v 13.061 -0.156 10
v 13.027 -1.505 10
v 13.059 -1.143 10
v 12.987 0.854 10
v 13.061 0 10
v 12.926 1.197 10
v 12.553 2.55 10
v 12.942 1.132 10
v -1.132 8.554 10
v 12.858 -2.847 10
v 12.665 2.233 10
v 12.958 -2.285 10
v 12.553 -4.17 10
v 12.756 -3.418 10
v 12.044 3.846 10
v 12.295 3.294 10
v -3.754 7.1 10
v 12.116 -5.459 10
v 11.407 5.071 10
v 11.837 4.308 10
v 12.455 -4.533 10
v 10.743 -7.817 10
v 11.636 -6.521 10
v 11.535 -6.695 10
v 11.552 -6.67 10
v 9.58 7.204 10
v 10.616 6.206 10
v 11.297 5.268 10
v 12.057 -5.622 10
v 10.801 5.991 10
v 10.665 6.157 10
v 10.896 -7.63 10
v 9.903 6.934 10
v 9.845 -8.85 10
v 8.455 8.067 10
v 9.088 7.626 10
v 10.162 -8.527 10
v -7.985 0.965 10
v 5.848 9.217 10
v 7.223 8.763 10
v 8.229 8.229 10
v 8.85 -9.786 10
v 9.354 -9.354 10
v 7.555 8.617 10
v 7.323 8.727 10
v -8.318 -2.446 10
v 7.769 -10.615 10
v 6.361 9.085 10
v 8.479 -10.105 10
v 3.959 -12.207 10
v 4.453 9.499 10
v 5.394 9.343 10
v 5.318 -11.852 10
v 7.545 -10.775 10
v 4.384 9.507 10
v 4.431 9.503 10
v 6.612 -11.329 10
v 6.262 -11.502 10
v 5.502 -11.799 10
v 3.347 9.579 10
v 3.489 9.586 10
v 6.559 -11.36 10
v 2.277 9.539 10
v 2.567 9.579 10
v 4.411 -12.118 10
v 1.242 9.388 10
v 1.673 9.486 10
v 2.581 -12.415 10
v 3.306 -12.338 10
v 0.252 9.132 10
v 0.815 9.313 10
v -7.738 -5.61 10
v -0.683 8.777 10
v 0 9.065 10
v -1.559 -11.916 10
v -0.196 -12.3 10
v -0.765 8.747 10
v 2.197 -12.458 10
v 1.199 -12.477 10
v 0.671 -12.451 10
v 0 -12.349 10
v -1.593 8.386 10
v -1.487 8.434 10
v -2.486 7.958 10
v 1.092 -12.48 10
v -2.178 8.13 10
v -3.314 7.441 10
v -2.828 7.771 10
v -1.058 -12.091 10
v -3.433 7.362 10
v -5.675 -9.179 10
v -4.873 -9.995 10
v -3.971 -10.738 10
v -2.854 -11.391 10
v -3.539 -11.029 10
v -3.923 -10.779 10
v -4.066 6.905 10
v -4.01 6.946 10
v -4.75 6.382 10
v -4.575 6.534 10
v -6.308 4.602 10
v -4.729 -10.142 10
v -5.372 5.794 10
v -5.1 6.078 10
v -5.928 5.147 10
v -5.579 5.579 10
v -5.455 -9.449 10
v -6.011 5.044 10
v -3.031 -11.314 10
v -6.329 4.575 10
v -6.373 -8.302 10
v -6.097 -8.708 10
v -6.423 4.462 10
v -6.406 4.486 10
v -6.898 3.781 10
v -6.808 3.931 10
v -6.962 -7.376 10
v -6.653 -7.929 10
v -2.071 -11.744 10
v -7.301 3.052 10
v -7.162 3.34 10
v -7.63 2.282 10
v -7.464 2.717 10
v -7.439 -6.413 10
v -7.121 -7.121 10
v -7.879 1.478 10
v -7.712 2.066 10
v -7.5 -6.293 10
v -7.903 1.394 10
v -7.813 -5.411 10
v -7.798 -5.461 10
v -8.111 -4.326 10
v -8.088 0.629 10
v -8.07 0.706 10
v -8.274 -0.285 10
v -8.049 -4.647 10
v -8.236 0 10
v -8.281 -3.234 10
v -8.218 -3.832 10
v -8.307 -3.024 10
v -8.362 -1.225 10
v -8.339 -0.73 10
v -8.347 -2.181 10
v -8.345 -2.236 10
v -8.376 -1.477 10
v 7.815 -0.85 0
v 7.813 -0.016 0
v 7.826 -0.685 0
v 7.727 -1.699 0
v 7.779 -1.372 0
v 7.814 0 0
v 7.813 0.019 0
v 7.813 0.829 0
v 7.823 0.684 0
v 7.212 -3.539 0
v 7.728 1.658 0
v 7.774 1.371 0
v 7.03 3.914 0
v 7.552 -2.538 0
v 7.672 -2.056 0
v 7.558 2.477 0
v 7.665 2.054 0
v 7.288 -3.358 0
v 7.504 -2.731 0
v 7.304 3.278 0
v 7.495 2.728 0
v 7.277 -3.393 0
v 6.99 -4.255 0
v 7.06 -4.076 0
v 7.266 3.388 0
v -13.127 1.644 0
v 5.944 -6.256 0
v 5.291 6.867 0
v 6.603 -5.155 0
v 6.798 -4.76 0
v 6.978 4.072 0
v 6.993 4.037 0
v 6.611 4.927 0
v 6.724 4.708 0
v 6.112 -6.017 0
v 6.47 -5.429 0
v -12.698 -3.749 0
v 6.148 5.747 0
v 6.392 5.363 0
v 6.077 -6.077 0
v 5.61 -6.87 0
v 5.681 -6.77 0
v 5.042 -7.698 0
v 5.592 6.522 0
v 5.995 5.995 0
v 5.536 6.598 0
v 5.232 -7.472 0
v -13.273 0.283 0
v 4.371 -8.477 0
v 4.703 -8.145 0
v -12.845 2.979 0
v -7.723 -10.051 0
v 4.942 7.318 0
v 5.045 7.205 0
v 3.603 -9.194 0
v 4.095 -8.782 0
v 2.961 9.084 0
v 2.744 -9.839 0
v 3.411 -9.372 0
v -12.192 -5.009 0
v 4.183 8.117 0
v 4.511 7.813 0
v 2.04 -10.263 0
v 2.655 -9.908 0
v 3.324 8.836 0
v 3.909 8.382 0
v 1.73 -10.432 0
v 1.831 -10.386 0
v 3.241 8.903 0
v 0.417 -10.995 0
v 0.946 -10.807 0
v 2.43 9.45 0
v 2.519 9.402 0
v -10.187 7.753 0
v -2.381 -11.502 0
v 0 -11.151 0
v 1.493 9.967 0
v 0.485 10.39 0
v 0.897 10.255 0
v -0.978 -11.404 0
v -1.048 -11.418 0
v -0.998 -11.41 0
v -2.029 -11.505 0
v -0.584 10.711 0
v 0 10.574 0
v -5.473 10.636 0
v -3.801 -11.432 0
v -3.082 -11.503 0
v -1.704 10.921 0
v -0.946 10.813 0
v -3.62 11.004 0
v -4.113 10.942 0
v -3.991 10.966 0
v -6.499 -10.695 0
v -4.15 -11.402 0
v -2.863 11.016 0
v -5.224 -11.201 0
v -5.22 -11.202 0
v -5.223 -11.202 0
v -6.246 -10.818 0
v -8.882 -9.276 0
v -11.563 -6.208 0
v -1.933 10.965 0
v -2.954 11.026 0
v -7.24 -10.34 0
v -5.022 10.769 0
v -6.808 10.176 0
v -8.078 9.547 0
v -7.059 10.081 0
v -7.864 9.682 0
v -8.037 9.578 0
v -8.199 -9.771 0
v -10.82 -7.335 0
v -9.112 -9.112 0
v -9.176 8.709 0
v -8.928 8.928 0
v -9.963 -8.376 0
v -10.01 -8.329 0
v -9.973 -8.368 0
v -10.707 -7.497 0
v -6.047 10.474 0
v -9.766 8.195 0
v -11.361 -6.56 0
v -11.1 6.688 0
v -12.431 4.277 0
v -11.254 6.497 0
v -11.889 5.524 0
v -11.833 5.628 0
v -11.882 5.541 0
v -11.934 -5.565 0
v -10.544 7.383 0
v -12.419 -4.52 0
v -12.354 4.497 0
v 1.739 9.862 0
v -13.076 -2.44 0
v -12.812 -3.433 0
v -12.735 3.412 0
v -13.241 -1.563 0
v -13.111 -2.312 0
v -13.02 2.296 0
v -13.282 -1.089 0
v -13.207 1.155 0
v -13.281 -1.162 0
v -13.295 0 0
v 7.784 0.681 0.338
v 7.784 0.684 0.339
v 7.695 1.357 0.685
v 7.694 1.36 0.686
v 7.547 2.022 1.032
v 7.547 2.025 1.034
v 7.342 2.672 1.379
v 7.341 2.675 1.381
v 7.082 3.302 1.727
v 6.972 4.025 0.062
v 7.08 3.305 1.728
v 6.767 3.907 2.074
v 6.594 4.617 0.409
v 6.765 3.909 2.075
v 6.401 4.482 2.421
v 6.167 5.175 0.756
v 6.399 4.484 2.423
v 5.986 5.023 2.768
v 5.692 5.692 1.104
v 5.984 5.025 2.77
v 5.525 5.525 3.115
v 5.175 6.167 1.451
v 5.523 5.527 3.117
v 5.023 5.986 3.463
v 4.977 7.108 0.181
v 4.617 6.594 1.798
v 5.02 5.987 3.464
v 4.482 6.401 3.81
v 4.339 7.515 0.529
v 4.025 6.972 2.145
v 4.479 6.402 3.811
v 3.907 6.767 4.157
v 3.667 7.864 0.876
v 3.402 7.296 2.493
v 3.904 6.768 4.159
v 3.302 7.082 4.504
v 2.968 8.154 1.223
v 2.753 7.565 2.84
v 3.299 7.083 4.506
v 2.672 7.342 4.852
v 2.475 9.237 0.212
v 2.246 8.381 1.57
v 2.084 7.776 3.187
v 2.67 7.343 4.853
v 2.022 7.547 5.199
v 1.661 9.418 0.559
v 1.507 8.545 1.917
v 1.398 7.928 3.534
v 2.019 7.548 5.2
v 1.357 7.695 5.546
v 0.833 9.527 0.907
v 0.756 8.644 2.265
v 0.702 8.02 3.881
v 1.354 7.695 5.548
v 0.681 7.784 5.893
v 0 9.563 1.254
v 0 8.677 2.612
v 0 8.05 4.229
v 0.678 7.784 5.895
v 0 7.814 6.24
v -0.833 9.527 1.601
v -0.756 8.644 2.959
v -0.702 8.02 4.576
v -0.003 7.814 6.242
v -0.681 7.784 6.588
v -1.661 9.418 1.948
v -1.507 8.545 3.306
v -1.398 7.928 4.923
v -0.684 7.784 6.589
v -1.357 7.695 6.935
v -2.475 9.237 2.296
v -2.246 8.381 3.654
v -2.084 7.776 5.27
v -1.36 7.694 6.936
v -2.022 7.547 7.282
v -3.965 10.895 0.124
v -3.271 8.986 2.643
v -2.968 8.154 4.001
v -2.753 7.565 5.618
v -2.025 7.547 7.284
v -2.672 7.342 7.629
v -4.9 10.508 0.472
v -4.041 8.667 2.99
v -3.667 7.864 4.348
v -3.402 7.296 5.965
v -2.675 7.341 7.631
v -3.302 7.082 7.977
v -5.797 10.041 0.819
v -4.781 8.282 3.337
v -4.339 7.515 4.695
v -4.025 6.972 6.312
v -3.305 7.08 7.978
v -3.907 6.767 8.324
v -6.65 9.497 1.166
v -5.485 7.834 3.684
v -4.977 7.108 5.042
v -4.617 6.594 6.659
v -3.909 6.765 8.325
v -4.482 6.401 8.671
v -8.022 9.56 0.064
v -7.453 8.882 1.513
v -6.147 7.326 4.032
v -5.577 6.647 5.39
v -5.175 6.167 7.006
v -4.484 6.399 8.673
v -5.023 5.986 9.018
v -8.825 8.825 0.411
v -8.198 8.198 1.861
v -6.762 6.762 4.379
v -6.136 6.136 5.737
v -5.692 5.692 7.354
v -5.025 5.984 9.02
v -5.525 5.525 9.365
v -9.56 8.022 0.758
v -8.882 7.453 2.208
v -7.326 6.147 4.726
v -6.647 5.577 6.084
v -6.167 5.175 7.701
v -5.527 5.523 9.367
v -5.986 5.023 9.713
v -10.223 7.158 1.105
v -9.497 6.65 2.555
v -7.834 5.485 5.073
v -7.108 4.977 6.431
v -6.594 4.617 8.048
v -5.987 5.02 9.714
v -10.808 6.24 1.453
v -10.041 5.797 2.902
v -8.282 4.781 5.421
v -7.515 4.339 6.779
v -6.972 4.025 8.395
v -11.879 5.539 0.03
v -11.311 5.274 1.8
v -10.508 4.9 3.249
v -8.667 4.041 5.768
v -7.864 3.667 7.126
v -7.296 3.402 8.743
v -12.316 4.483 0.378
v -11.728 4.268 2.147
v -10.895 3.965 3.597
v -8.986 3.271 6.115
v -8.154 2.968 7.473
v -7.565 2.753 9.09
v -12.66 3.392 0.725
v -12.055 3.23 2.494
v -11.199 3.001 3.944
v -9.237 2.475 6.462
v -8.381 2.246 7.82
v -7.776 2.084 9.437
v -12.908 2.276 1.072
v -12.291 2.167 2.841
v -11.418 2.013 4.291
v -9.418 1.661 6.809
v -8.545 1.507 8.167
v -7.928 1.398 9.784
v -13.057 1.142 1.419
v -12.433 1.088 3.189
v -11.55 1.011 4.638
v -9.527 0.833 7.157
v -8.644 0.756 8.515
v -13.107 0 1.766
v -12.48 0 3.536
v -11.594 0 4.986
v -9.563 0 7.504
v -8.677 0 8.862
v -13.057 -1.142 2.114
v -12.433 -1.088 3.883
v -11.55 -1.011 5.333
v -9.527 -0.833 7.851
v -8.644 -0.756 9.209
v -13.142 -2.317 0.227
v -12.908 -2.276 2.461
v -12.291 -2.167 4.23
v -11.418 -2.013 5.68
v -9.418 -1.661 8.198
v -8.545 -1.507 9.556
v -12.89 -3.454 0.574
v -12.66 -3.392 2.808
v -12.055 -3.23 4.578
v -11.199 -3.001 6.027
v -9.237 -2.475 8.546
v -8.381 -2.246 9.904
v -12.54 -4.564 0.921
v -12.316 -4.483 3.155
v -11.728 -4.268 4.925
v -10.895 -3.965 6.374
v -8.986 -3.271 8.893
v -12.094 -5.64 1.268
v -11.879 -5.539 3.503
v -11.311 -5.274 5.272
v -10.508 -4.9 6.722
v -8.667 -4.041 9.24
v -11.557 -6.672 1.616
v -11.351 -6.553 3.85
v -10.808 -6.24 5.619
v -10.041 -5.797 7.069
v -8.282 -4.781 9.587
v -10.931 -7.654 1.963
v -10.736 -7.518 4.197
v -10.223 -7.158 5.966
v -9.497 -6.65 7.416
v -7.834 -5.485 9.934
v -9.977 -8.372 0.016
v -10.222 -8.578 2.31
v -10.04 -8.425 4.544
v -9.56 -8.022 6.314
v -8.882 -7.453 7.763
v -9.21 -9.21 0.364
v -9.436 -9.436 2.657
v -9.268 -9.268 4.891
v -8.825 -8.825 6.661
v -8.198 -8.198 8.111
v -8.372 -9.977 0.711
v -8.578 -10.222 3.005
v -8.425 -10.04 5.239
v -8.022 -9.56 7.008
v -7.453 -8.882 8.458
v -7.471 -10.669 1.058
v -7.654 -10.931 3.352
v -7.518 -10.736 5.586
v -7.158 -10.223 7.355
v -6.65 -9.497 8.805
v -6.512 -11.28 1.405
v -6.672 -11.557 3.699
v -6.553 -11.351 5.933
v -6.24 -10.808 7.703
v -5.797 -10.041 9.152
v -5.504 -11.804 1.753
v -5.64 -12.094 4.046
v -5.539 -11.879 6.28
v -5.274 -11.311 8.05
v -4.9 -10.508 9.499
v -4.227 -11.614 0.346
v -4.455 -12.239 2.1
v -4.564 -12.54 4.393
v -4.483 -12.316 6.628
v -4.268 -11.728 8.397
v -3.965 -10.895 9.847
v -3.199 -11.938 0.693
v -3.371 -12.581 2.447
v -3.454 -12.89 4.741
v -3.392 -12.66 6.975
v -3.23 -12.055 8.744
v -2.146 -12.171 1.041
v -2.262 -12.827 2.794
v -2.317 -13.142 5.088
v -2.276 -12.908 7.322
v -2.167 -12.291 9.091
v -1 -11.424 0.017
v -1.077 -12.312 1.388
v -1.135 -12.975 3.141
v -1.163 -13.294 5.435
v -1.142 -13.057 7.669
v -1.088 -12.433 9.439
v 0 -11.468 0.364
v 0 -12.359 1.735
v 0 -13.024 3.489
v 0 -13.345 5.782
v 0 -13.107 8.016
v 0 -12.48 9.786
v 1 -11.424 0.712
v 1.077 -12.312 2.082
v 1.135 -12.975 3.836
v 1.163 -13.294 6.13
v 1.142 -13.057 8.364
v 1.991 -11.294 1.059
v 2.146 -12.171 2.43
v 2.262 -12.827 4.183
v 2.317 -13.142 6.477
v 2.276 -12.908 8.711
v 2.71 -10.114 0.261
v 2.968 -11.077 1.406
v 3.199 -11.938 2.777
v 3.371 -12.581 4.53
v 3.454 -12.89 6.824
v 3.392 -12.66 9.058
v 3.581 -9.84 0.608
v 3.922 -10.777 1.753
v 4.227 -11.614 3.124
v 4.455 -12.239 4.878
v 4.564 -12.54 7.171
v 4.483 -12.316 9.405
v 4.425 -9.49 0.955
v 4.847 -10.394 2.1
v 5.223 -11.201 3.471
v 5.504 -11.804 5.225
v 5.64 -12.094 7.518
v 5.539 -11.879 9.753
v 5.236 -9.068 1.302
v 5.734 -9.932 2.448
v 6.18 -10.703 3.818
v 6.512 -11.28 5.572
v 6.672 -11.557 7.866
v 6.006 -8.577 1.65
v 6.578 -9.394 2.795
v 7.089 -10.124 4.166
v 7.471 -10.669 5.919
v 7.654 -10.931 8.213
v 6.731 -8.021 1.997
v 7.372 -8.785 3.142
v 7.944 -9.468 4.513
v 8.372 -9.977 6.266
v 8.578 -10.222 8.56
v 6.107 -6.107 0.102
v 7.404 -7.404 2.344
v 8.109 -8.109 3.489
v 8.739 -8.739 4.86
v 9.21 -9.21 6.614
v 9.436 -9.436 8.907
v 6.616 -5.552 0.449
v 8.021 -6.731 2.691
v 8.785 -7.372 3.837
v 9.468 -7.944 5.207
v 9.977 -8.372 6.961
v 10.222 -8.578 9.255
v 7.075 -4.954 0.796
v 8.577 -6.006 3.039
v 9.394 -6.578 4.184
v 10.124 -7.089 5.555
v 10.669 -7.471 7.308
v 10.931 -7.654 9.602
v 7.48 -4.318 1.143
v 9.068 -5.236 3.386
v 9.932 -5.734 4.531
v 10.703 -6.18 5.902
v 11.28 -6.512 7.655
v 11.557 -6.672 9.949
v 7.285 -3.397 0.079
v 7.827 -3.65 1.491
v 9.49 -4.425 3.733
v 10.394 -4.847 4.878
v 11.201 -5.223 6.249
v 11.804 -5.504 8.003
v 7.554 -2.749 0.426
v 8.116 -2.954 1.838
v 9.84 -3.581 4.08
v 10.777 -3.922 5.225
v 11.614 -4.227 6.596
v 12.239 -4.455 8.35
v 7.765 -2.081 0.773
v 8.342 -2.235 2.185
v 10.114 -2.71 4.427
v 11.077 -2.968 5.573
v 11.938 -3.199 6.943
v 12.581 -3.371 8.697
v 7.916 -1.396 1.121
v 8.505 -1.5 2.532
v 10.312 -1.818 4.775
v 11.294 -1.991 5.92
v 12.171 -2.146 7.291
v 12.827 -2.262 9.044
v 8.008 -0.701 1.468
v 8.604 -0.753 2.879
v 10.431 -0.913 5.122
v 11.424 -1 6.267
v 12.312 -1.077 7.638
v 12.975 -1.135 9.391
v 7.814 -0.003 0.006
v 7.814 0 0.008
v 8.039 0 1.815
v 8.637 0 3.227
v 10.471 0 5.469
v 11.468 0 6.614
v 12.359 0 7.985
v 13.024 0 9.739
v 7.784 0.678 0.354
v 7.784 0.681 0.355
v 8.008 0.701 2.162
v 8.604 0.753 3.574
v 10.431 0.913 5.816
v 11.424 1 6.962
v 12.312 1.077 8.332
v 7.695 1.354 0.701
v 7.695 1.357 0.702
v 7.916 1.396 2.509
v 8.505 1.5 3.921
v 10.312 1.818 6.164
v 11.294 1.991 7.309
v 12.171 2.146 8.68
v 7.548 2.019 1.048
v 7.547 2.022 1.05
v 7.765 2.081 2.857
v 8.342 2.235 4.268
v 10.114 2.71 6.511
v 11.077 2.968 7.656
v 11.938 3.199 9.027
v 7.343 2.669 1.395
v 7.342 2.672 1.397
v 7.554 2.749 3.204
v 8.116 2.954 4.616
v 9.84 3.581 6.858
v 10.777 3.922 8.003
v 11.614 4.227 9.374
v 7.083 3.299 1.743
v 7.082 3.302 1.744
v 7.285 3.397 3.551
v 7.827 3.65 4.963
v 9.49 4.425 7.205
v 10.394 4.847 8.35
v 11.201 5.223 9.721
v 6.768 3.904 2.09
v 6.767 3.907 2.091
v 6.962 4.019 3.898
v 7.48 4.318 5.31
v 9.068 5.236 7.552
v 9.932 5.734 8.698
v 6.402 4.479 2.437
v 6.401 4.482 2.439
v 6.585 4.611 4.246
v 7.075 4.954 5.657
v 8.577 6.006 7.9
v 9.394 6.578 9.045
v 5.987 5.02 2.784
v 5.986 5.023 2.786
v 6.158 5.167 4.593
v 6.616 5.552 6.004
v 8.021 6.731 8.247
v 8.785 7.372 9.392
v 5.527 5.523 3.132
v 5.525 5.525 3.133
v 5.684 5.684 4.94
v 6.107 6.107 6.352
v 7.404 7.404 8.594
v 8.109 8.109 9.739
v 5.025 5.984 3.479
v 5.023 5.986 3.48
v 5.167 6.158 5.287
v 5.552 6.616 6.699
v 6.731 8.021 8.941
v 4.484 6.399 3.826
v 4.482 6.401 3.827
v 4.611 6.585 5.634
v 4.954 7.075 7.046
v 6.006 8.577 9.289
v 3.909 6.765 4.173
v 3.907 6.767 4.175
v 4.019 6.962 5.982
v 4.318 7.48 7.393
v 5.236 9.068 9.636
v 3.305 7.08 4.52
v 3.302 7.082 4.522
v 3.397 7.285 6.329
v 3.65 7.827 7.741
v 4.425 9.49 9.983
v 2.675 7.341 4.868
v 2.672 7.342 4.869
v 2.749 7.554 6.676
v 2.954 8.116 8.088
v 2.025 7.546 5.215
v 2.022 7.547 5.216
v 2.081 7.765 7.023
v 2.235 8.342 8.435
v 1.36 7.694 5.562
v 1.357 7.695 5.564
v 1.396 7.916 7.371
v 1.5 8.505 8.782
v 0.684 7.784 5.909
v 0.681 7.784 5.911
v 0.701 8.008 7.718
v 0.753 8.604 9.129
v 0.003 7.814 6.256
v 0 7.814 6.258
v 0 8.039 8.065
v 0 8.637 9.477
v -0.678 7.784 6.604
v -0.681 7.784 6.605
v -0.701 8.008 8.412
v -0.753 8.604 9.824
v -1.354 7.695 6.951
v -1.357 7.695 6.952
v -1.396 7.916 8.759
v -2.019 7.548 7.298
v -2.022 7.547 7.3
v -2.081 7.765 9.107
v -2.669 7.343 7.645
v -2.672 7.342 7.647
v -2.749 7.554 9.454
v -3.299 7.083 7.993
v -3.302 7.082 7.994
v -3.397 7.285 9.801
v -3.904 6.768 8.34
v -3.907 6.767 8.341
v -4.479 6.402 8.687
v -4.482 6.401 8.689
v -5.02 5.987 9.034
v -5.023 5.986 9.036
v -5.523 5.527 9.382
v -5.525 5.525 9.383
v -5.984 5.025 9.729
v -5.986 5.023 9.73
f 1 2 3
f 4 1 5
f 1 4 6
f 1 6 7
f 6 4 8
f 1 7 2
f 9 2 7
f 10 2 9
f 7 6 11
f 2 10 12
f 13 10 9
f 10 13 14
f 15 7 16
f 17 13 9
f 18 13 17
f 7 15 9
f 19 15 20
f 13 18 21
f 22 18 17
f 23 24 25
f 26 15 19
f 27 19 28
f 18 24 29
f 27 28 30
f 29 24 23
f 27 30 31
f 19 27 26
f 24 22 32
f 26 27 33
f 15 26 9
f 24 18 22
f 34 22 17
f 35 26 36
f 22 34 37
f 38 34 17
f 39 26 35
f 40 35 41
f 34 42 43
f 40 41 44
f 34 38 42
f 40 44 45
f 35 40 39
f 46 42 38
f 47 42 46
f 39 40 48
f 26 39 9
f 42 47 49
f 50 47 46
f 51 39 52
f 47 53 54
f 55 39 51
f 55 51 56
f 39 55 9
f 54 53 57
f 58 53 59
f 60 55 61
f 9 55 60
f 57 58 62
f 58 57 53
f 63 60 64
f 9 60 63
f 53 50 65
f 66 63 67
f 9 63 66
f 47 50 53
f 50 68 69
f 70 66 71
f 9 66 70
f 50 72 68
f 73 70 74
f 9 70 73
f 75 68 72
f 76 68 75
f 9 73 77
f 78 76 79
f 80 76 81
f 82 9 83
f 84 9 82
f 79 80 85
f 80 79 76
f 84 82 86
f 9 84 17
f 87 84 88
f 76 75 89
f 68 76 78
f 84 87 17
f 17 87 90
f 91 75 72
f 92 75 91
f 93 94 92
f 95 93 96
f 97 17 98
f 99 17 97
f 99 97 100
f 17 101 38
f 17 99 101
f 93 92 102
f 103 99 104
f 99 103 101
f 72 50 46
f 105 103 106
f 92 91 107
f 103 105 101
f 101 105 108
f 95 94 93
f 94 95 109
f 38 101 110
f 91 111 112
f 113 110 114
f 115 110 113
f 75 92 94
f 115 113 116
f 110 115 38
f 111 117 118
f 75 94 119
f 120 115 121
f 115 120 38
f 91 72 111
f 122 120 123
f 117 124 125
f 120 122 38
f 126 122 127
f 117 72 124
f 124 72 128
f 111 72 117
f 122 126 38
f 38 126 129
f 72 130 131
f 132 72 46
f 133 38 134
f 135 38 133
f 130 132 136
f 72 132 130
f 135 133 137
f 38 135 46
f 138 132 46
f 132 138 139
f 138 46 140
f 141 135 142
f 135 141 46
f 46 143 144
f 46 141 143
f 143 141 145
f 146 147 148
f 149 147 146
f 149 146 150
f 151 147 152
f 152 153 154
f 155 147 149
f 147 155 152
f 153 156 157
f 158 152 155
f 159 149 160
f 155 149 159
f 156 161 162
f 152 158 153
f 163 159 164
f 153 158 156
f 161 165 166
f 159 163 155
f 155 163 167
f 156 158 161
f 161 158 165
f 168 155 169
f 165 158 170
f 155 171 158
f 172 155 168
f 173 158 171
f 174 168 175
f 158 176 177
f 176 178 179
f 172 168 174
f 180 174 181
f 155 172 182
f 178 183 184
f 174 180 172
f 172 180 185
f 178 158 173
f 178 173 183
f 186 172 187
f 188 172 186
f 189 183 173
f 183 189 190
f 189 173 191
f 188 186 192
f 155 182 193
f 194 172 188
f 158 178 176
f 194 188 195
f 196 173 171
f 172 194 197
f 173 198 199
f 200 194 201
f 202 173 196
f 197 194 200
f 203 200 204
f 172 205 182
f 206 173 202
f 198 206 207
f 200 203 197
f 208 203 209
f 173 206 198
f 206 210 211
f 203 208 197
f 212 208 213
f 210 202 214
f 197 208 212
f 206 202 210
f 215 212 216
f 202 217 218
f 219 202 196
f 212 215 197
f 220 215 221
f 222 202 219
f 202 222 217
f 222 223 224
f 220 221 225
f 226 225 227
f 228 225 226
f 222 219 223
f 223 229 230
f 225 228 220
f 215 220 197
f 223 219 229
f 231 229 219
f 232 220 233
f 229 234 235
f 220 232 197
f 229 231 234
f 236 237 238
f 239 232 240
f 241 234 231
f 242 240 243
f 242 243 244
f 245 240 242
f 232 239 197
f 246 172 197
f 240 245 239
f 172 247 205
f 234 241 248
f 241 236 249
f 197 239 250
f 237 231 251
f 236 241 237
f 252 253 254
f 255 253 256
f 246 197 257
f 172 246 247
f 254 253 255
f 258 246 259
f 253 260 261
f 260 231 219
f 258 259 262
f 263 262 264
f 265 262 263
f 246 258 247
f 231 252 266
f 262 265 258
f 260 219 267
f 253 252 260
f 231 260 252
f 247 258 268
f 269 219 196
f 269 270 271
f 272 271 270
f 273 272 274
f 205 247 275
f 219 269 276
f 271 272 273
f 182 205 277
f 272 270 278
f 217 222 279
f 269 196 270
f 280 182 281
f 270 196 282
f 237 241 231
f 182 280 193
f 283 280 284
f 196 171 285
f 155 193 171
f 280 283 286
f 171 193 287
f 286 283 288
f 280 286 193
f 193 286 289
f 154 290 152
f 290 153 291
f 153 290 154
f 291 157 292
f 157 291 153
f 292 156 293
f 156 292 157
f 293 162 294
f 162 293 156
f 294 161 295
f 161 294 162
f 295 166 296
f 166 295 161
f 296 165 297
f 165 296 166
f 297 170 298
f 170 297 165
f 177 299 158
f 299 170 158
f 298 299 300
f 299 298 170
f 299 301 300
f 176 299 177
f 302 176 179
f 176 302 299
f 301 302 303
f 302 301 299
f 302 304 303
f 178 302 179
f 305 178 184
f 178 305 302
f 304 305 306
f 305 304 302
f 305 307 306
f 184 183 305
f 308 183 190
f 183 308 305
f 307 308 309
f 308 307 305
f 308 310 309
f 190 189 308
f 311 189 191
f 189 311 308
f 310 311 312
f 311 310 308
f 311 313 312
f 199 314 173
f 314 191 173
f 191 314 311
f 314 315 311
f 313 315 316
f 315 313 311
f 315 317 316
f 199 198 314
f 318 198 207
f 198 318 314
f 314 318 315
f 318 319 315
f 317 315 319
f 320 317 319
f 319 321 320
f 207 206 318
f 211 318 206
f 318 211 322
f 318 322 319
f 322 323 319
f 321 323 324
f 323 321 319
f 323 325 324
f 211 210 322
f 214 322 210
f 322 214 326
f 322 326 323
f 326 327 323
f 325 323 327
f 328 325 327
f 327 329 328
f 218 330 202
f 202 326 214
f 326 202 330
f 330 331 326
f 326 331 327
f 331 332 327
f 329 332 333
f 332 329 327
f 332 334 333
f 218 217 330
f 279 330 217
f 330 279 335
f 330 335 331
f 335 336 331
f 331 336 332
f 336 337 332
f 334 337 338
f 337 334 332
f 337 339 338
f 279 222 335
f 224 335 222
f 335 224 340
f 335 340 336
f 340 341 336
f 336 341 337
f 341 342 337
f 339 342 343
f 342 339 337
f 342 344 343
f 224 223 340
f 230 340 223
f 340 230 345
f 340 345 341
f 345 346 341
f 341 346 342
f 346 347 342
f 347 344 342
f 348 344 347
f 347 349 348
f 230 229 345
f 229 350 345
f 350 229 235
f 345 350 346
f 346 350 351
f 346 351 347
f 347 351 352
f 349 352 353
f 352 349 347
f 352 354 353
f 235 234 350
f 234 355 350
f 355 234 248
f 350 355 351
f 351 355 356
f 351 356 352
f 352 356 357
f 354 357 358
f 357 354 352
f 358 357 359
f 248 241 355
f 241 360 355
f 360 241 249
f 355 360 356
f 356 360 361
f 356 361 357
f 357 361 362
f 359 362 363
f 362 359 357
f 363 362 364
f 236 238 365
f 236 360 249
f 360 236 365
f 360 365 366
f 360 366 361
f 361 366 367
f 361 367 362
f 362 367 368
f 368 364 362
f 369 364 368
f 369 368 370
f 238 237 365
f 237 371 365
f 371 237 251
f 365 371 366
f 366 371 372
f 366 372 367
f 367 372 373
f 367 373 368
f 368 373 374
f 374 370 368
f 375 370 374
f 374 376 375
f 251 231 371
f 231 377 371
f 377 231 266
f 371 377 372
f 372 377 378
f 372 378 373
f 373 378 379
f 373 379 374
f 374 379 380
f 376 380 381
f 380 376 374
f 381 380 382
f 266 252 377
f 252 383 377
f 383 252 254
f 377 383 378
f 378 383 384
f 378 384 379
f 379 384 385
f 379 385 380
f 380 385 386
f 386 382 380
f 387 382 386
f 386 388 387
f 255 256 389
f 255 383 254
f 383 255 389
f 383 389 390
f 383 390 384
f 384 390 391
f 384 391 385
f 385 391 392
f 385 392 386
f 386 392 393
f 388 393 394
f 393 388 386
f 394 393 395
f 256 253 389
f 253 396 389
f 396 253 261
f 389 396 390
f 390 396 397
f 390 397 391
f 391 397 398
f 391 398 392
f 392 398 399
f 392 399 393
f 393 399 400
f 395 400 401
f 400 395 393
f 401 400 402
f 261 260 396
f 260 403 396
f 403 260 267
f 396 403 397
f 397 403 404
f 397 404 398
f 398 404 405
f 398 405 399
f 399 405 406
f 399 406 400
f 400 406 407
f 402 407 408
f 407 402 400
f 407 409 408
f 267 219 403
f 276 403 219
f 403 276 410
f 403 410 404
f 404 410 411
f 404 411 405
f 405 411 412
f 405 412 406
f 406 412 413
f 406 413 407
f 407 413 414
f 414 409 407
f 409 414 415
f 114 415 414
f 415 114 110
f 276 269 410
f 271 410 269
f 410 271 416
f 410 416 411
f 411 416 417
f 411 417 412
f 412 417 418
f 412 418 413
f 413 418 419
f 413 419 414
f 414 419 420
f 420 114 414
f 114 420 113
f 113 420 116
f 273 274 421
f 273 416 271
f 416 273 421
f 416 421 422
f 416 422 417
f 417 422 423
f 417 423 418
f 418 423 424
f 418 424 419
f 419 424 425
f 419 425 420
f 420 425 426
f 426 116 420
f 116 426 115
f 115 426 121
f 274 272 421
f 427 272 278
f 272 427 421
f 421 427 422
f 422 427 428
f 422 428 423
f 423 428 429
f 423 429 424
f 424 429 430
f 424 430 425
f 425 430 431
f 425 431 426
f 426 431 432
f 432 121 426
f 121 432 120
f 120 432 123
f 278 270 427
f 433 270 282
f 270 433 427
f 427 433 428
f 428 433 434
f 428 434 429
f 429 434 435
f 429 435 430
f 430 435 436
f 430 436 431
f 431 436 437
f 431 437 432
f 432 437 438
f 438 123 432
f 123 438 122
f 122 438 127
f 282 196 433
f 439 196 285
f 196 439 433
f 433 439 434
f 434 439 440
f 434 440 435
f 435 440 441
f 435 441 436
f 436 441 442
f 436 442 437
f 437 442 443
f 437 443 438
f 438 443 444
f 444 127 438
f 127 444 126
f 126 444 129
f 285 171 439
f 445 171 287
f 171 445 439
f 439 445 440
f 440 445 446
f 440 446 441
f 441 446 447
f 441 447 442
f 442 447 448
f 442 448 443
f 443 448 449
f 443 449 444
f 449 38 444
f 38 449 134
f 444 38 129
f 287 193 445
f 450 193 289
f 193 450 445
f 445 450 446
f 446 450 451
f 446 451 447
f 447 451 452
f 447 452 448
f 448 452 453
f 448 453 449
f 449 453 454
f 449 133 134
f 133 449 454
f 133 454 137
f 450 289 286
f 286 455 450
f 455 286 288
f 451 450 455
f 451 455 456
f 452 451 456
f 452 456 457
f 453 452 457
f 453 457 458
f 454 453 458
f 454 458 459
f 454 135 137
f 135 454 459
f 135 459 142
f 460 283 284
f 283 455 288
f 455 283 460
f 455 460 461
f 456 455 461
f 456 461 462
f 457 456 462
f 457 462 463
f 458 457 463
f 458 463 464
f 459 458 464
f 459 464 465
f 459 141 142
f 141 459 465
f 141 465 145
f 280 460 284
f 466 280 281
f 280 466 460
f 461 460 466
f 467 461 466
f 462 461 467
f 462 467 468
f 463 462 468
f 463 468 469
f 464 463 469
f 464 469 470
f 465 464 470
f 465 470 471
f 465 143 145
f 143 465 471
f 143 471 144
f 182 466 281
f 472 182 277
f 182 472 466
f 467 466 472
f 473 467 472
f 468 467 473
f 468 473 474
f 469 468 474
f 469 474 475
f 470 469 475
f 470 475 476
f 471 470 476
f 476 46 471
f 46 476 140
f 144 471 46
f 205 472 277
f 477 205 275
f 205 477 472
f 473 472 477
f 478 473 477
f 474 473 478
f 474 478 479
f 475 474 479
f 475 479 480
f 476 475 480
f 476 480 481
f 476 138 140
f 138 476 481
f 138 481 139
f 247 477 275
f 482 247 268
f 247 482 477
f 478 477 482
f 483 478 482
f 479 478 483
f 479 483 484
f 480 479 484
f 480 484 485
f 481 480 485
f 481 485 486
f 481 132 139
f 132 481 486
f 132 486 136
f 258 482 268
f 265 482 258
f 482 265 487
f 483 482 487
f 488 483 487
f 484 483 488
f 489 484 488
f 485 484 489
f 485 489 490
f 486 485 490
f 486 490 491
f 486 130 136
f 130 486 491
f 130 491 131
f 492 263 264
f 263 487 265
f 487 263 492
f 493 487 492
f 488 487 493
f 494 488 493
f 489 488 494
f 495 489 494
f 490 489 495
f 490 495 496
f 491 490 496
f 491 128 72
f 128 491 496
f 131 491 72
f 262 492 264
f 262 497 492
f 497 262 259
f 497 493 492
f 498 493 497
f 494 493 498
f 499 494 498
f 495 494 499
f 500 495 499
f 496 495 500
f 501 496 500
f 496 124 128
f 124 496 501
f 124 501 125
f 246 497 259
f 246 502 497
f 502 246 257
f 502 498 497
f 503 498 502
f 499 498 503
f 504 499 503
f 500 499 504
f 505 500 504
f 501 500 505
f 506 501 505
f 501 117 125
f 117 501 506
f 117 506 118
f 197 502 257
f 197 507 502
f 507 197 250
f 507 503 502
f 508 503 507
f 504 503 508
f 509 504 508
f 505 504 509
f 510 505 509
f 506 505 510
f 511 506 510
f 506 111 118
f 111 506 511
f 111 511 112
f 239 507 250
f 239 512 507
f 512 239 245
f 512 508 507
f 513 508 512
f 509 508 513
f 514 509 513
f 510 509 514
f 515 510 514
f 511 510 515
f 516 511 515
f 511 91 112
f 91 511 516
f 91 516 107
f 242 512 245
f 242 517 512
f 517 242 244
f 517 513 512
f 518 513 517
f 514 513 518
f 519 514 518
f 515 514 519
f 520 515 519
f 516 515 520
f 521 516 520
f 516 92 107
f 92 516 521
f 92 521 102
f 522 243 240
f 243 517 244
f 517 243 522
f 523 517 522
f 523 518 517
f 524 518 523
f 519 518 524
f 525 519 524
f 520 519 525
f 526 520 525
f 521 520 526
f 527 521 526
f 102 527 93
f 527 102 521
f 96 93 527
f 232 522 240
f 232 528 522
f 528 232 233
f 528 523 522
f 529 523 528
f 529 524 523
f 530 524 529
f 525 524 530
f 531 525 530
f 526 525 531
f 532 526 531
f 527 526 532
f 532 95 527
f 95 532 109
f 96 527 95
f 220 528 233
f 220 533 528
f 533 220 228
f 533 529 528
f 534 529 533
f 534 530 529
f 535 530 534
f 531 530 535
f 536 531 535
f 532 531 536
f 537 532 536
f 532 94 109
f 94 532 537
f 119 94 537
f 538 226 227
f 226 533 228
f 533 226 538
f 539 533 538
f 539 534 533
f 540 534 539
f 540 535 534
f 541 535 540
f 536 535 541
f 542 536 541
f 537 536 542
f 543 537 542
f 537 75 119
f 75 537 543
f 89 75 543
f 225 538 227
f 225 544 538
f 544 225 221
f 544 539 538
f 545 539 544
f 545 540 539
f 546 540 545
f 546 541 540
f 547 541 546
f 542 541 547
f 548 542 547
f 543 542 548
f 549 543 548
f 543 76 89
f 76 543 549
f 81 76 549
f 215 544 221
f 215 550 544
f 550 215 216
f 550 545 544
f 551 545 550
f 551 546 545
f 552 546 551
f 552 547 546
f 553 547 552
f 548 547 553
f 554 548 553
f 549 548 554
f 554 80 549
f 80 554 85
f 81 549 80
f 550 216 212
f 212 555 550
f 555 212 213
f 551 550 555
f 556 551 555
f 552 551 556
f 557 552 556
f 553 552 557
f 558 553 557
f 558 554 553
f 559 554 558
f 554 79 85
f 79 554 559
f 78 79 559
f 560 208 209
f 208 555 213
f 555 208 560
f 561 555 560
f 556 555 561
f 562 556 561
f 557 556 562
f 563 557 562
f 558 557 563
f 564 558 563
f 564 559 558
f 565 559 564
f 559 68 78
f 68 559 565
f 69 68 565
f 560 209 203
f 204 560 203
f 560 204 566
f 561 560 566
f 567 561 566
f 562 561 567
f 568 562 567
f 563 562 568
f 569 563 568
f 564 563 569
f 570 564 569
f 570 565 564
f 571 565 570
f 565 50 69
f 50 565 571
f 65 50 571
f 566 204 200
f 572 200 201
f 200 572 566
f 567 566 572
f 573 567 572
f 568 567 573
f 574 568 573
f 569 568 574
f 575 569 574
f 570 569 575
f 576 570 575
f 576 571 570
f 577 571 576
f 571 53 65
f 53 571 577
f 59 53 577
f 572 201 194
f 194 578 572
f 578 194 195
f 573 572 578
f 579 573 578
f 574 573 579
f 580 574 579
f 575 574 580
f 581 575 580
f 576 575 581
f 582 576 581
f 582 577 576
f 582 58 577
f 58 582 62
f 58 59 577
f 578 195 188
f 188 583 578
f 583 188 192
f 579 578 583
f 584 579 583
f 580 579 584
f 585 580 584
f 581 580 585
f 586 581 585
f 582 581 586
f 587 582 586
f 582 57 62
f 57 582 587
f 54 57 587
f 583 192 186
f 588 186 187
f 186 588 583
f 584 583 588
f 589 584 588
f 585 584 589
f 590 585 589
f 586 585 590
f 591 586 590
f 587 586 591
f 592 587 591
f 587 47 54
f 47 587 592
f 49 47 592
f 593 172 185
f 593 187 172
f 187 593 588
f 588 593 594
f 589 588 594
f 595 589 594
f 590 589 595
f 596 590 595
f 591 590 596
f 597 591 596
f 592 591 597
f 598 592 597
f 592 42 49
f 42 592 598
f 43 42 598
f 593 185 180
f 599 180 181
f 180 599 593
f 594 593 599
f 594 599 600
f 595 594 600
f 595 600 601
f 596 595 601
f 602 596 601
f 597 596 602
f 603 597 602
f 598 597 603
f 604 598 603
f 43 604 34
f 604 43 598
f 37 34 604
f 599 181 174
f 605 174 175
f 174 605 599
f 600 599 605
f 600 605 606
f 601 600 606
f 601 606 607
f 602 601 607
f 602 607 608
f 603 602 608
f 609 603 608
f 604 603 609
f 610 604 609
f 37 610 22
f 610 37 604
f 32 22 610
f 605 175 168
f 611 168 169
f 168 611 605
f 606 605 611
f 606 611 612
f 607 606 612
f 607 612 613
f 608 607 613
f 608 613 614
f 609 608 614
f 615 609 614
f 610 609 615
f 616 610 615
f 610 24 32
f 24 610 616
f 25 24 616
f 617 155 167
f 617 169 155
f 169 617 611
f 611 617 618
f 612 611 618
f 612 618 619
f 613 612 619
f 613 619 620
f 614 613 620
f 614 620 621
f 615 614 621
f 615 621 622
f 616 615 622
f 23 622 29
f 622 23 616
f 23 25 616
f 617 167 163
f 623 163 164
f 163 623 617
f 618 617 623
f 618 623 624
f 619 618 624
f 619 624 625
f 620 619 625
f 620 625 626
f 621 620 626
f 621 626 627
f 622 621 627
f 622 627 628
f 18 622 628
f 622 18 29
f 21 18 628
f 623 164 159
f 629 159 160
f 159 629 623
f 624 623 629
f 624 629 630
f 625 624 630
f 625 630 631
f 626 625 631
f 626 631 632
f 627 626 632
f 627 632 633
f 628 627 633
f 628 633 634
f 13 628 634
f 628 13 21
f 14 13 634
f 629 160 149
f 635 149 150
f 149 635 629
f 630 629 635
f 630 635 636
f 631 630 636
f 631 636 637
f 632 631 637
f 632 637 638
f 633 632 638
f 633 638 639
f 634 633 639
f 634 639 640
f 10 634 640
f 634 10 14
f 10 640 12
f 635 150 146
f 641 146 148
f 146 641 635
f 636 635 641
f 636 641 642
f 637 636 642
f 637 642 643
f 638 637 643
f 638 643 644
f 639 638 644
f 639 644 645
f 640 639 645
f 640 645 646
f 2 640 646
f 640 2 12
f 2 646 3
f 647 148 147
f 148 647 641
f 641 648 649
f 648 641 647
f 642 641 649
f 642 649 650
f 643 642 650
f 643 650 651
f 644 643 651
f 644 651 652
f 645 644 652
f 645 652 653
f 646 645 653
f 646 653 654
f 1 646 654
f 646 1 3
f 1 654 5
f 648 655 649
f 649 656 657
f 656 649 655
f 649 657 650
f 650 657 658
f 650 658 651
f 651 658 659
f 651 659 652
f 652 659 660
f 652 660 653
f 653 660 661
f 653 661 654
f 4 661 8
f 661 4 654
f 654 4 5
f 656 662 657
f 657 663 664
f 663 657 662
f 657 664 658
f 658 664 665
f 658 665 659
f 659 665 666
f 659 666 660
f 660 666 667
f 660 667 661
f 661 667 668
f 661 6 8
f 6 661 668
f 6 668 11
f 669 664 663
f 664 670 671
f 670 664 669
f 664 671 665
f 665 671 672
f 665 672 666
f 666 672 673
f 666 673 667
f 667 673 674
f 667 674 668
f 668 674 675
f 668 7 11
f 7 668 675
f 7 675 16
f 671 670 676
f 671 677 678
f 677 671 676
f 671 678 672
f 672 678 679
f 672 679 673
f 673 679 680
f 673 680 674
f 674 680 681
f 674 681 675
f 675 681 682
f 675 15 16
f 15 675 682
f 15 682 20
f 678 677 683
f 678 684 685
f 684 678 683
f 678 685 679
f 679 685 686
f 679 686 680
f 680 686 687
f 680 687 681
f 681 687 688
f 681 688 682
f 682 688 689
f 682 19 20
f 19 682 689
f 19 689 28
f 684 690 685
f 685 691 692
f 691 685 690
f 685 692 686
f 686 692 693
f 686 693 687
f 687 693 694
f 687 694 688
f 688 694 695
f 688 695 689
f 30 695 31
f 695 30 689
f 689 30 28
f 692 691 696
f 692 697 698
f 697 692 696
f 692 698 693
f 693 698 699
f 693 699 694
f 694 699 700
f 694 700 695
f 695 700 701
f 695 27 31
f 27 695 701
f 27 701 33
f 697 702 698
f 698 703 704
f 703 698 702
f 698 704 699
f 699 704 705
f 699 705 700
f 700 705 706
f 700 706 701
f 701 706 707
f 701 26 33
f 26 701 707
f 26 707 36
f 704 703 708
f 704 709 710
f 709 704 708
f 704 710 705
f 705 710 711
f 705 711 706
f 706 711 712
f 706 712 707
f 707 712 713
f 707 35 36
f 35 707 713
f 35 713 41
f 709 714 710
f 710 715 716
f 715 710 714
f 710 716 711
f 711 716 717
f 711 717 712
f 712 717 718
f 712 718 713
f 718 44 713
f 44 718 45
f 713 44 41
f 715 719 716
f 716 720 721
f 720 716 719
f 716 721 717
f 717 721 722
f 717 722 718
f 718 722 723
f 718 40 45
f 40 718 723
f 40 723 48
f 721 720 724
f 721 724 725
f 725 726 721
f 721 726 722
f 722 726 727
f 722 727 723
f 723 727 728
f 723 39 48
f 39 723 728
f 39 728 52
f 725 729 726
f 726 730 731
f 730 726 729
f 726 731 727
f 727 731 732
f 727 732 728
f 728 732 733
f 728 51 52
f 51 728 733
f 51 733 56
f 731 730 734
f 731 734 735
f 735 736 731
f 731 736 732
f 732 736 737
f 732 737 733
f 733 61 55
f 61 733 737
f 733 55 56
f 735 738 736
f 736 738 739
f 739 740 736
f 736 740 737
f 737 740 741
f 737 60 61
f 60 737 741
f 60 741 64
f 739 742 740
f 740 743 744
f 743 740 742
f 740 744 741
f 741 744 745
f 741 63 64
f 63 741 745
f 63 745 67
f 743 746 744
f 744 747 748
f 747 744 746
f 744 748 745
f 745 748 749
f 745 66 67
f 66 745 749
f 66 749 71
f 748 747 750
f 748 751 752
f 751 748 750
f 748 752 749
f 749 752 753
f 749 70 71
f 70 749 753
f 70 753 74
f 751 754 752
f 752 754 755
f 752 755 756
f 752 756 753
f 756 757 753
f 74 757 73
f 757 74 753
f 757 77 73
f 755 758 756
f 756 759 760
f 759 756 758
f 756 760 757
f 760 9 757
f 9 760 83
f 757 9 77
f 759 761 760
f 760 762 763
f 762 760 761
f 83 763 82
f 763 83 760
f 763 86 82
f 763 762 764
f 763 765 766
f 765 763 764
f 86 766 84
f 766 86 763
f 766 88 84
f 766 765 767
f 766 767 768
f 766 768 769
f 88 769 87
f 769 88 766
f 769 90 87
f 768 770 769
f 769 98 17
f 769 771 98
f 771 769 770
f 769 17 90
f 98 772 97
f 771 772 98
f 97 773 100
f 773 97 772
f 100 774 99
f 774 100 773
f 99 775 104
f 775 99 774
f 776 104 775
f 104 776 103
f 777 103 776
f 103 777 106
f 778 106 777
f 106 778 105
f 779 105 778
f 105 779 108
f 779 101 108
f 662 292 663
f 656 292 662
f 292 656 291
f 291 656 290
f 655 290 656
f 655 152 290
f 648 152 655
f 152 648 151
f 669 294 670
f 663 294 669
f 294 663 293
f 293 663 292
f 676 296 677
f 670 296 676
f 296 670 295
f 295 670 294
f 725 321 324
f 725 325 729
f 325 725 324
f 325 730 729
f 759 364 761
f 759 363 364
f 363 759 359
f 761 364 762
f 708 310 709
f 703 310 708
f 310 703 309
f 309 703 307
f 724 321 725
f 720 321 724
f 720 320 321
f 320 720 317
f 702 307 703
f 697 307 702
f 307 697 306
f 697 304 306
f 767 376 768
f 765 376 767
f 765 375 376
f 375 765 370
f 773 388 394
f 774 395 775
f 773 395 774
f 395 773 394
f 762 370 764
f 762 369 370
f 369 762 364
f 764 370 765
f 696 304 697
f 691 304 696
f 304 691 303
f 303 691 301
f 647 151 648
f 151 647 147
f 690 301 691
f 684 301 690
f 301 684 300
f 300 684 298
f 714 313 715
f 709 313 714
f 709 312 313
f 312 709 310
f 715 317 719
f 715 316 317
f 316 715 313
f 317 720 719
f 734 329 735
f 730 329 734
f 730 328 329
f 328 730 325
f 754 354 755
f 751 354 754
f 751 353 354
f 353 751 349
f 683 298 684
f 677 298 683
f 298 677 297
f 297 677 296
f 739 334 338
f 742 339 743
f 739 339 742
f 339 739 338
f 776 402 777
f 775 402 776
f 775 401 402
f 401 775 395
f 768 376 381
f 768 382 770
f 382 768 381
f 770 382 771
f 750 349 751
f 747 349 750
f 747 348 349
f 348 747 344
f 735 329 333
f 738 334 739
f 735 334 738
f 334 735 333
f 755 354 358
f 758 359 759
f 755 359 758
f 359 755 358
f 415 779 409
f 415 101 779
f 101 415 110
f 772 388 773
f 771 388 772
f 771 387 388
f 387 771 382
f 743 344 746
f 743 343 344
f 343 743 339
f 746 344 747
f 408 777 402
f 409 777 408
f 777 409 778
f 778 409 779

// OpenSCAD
// file: quickthread.scad
function _ringPoints(param) = len(param[0]);
function _ringValue(param,point) = param[0][point];
function _numTurns(param) = param[2];
function _numRings(param) = 1+_numTurns(param)*$fn;
function _radius(param) = param[1];
function _lead(param) = param[3];

extrNudge = 0.001;

function extrPoints(param) = 
    let (n=_ringPoints(param),
        r=_radius(param),
        m=_numRings(param),
        l=_lead(param)
        ) 
        [ for (i=[0:m-1]) for (j=[0:n-1]) 
            let (z=i/$fn*l,
                angle=(i%$fn)/$fn*360,
                v=_ringValue(param,j))
            [ (r+v[0])*cos(angle), (r+v[0])*sin(angle),z+v[1]] ];
        
function mod(m,n) = let(mm = m%n) mm<0 ? n+mm : mm;
        
function extrPointIndex(param,ring,point) = 
    let (n=_ringPoints(param)) 
        n*ring + mod(point,n);
        
function startFacePoints(param) = 
    let (n=_ringPoints(param)) 
        [for (i=[0:n-1]) extrPointIndex(param,0,i)];
            
function endFacePoints(param) = 
    let (m=_numRings(param), n=_ringPoints(param)) 
            [for (i=[n-1:-1:0]) extrPointIndex(param,m-1,i)];
                
function tubeFaces(param) =
    let (m=_numRings(param), n=_ringPoints(param))
            [for (i=[0:m-2]) for (j=[0:n-1]) for(tri=[0:1])
                tri==0 ? 
                    [extrPointIndex(param,i,j),extrPointIndex(param,i+1,j),extrPointIndex(param,i,j+1)] :
                    [extrPointIndex(param,i,j+1), extrPointIndex(param,i+1,j),
            extrPointIndex(param,i+1,j+1)]];
                

function extrFaces(param) = concat([startFacePoints(param)],concat(tubeFaces(param),[endFacePoints(param)]));

                    
module rawThread(profile, r=undef, d=undef, height=10, lead=undef, $fn=72, adjustRadius=false) {
    radius = (r==undef ? d/2 : r);
    vSize = max([for(v1=profile) for(v2=profile) v2[1]-v1[1]]);
    vMin = min([for(v=profile) v[0]]);
    radiusAdjustment = adjustRadius ? vMin : 0;
    _lead = lead==undef ? vSize : lead;
    profileScale = vSize <= _lead-extrNudge ? 1 : (_lead-extrNudge)/vSize;
    adjProfile = [for(v=profile) [v[0]-radiusAdjustment,v[1]*profileScale]];
    adjRadius = radius + radiusAdjustment;
    hSize = 1+2*adjRadius + 2*max([for (v=adjProfile) v[0]]);
    numTurns = 2+ceil(height/_lead);
    param = [adjProfile, adjRadius, numTurns, _lead];
    render(convexity=10)
    union() {
        intersection() {
            translate([-hSize/2,-hSize/2,0]) cube([hSize,hSize,height]);
            translate([0,0,-_lead]) polyhedron(faces=extrFaces(param),points=extrPoints(param));
        }
        //rotate([0,0,180/$fn]) 
        cylinder(r=adjRadius+extrNudge,$fn=$fn,h=height);
    }
}

// internal = female
module isoMetricThread(d=undef, r=undef, pitch=1, h=10, lead=undef, angle=30, internal=false, $fn=72) {
    radius = r==undef ? d/2 : r;
    Dmaj = 2*radius;
    H = pitch * cos(angle);
    _lead = lead==undef ? pitch : lead;
    externalReliefRatio=0.03;
    internalReliefRatio=0.057;
    profile = !internal ? 
        [ [-H*externalReliefRatio,(-3/8)*pitch-pitch*externalReliefRatio], /* [0,-(3/8)*pitch], */ 
    [(5/8)*H,-pitch/16],[(5/8)*H,pitch/16], /*[0,(3/8)*pitch],*/
    [-H*externalReliefRatio,(3/8)*pitch+pitch*externalReliefRatio] ] :
        [ [0,-(3/8)*pitch], [(5/8)*H,-pitch/16],[(5/8)*H+H*externalReliefRatio,0],[(5/8)*H,pitch/16],[0,(3/8)*pitch] ];
    Dmin = Dmaj-2*H/4;
    myFN=$fn;
    rawThread(profile,d=Dmin,height=h,lead=_lead,$fn=myFN,adjustRadius=true);        
}

//rawThread([[0,0],[1.5,1.5],[0,3]], r=25, 91, 3);
//rawThread([[0,0],[0,3],[3,3],[3,0]], r=25, 50, 6, $fn=80);
isoMetricThread(d=50,h=15,pitch=3,angle=45,internal=false,$fn=3);
//rawThread([[0,0],[1,0],[.5,.5],[1,1],[0,1]],r=20,h=10,lead=1.5);
// main file
use <quickthread.scad>;

verticalPeriod = 25;
horizontalAmplitude = 5;
slicesPerPeriod = 24;
height = 100;

center_solomonic_1 = [79.199909333,42.292352021];
size_solomonic_1 = [1.631156250,7.371619750];
stroke_width_solomonic_1 = 0.066145833;
// paths for solomonic_1
points_solomonic_1_1 = [ [-0.815578125,-3.685809875],[-0.748958998,-3.150609391],[-0.572605793,-2.734330050],[-0.031722219,-2.073088138],[0.262295618,-1.735402233],[0.525022465,-1.331190808],[0.721202056,-0.814092195],[0.815578125,-0.137744729],[0.745489380,0.521014405],[0.560709961,1.042796876],[0.299470093,1.470260329],[-0.299470093,2.212860759],[-0.560709961,2.613313024],[-0.745489380,3.090076848],[-0.815578125,3.685809875] ];

points_left = points_solomonic_1_1[0][0];
points_bottom = points_solomonic_1_1[0][1];
points_top = points_solomonic_1_1[len(points_solomonic_1_1)-1][1];
scale = verticalPeriod / (points_top-points_bottom);
innerDiameter = 4.607347540 * scale;
profile = scale * [for (p=points_solomonic_1_1) p-[points_left,points_bottom]];
rawThread(profile, d=innerDiameter, h=height, clip=true);    
